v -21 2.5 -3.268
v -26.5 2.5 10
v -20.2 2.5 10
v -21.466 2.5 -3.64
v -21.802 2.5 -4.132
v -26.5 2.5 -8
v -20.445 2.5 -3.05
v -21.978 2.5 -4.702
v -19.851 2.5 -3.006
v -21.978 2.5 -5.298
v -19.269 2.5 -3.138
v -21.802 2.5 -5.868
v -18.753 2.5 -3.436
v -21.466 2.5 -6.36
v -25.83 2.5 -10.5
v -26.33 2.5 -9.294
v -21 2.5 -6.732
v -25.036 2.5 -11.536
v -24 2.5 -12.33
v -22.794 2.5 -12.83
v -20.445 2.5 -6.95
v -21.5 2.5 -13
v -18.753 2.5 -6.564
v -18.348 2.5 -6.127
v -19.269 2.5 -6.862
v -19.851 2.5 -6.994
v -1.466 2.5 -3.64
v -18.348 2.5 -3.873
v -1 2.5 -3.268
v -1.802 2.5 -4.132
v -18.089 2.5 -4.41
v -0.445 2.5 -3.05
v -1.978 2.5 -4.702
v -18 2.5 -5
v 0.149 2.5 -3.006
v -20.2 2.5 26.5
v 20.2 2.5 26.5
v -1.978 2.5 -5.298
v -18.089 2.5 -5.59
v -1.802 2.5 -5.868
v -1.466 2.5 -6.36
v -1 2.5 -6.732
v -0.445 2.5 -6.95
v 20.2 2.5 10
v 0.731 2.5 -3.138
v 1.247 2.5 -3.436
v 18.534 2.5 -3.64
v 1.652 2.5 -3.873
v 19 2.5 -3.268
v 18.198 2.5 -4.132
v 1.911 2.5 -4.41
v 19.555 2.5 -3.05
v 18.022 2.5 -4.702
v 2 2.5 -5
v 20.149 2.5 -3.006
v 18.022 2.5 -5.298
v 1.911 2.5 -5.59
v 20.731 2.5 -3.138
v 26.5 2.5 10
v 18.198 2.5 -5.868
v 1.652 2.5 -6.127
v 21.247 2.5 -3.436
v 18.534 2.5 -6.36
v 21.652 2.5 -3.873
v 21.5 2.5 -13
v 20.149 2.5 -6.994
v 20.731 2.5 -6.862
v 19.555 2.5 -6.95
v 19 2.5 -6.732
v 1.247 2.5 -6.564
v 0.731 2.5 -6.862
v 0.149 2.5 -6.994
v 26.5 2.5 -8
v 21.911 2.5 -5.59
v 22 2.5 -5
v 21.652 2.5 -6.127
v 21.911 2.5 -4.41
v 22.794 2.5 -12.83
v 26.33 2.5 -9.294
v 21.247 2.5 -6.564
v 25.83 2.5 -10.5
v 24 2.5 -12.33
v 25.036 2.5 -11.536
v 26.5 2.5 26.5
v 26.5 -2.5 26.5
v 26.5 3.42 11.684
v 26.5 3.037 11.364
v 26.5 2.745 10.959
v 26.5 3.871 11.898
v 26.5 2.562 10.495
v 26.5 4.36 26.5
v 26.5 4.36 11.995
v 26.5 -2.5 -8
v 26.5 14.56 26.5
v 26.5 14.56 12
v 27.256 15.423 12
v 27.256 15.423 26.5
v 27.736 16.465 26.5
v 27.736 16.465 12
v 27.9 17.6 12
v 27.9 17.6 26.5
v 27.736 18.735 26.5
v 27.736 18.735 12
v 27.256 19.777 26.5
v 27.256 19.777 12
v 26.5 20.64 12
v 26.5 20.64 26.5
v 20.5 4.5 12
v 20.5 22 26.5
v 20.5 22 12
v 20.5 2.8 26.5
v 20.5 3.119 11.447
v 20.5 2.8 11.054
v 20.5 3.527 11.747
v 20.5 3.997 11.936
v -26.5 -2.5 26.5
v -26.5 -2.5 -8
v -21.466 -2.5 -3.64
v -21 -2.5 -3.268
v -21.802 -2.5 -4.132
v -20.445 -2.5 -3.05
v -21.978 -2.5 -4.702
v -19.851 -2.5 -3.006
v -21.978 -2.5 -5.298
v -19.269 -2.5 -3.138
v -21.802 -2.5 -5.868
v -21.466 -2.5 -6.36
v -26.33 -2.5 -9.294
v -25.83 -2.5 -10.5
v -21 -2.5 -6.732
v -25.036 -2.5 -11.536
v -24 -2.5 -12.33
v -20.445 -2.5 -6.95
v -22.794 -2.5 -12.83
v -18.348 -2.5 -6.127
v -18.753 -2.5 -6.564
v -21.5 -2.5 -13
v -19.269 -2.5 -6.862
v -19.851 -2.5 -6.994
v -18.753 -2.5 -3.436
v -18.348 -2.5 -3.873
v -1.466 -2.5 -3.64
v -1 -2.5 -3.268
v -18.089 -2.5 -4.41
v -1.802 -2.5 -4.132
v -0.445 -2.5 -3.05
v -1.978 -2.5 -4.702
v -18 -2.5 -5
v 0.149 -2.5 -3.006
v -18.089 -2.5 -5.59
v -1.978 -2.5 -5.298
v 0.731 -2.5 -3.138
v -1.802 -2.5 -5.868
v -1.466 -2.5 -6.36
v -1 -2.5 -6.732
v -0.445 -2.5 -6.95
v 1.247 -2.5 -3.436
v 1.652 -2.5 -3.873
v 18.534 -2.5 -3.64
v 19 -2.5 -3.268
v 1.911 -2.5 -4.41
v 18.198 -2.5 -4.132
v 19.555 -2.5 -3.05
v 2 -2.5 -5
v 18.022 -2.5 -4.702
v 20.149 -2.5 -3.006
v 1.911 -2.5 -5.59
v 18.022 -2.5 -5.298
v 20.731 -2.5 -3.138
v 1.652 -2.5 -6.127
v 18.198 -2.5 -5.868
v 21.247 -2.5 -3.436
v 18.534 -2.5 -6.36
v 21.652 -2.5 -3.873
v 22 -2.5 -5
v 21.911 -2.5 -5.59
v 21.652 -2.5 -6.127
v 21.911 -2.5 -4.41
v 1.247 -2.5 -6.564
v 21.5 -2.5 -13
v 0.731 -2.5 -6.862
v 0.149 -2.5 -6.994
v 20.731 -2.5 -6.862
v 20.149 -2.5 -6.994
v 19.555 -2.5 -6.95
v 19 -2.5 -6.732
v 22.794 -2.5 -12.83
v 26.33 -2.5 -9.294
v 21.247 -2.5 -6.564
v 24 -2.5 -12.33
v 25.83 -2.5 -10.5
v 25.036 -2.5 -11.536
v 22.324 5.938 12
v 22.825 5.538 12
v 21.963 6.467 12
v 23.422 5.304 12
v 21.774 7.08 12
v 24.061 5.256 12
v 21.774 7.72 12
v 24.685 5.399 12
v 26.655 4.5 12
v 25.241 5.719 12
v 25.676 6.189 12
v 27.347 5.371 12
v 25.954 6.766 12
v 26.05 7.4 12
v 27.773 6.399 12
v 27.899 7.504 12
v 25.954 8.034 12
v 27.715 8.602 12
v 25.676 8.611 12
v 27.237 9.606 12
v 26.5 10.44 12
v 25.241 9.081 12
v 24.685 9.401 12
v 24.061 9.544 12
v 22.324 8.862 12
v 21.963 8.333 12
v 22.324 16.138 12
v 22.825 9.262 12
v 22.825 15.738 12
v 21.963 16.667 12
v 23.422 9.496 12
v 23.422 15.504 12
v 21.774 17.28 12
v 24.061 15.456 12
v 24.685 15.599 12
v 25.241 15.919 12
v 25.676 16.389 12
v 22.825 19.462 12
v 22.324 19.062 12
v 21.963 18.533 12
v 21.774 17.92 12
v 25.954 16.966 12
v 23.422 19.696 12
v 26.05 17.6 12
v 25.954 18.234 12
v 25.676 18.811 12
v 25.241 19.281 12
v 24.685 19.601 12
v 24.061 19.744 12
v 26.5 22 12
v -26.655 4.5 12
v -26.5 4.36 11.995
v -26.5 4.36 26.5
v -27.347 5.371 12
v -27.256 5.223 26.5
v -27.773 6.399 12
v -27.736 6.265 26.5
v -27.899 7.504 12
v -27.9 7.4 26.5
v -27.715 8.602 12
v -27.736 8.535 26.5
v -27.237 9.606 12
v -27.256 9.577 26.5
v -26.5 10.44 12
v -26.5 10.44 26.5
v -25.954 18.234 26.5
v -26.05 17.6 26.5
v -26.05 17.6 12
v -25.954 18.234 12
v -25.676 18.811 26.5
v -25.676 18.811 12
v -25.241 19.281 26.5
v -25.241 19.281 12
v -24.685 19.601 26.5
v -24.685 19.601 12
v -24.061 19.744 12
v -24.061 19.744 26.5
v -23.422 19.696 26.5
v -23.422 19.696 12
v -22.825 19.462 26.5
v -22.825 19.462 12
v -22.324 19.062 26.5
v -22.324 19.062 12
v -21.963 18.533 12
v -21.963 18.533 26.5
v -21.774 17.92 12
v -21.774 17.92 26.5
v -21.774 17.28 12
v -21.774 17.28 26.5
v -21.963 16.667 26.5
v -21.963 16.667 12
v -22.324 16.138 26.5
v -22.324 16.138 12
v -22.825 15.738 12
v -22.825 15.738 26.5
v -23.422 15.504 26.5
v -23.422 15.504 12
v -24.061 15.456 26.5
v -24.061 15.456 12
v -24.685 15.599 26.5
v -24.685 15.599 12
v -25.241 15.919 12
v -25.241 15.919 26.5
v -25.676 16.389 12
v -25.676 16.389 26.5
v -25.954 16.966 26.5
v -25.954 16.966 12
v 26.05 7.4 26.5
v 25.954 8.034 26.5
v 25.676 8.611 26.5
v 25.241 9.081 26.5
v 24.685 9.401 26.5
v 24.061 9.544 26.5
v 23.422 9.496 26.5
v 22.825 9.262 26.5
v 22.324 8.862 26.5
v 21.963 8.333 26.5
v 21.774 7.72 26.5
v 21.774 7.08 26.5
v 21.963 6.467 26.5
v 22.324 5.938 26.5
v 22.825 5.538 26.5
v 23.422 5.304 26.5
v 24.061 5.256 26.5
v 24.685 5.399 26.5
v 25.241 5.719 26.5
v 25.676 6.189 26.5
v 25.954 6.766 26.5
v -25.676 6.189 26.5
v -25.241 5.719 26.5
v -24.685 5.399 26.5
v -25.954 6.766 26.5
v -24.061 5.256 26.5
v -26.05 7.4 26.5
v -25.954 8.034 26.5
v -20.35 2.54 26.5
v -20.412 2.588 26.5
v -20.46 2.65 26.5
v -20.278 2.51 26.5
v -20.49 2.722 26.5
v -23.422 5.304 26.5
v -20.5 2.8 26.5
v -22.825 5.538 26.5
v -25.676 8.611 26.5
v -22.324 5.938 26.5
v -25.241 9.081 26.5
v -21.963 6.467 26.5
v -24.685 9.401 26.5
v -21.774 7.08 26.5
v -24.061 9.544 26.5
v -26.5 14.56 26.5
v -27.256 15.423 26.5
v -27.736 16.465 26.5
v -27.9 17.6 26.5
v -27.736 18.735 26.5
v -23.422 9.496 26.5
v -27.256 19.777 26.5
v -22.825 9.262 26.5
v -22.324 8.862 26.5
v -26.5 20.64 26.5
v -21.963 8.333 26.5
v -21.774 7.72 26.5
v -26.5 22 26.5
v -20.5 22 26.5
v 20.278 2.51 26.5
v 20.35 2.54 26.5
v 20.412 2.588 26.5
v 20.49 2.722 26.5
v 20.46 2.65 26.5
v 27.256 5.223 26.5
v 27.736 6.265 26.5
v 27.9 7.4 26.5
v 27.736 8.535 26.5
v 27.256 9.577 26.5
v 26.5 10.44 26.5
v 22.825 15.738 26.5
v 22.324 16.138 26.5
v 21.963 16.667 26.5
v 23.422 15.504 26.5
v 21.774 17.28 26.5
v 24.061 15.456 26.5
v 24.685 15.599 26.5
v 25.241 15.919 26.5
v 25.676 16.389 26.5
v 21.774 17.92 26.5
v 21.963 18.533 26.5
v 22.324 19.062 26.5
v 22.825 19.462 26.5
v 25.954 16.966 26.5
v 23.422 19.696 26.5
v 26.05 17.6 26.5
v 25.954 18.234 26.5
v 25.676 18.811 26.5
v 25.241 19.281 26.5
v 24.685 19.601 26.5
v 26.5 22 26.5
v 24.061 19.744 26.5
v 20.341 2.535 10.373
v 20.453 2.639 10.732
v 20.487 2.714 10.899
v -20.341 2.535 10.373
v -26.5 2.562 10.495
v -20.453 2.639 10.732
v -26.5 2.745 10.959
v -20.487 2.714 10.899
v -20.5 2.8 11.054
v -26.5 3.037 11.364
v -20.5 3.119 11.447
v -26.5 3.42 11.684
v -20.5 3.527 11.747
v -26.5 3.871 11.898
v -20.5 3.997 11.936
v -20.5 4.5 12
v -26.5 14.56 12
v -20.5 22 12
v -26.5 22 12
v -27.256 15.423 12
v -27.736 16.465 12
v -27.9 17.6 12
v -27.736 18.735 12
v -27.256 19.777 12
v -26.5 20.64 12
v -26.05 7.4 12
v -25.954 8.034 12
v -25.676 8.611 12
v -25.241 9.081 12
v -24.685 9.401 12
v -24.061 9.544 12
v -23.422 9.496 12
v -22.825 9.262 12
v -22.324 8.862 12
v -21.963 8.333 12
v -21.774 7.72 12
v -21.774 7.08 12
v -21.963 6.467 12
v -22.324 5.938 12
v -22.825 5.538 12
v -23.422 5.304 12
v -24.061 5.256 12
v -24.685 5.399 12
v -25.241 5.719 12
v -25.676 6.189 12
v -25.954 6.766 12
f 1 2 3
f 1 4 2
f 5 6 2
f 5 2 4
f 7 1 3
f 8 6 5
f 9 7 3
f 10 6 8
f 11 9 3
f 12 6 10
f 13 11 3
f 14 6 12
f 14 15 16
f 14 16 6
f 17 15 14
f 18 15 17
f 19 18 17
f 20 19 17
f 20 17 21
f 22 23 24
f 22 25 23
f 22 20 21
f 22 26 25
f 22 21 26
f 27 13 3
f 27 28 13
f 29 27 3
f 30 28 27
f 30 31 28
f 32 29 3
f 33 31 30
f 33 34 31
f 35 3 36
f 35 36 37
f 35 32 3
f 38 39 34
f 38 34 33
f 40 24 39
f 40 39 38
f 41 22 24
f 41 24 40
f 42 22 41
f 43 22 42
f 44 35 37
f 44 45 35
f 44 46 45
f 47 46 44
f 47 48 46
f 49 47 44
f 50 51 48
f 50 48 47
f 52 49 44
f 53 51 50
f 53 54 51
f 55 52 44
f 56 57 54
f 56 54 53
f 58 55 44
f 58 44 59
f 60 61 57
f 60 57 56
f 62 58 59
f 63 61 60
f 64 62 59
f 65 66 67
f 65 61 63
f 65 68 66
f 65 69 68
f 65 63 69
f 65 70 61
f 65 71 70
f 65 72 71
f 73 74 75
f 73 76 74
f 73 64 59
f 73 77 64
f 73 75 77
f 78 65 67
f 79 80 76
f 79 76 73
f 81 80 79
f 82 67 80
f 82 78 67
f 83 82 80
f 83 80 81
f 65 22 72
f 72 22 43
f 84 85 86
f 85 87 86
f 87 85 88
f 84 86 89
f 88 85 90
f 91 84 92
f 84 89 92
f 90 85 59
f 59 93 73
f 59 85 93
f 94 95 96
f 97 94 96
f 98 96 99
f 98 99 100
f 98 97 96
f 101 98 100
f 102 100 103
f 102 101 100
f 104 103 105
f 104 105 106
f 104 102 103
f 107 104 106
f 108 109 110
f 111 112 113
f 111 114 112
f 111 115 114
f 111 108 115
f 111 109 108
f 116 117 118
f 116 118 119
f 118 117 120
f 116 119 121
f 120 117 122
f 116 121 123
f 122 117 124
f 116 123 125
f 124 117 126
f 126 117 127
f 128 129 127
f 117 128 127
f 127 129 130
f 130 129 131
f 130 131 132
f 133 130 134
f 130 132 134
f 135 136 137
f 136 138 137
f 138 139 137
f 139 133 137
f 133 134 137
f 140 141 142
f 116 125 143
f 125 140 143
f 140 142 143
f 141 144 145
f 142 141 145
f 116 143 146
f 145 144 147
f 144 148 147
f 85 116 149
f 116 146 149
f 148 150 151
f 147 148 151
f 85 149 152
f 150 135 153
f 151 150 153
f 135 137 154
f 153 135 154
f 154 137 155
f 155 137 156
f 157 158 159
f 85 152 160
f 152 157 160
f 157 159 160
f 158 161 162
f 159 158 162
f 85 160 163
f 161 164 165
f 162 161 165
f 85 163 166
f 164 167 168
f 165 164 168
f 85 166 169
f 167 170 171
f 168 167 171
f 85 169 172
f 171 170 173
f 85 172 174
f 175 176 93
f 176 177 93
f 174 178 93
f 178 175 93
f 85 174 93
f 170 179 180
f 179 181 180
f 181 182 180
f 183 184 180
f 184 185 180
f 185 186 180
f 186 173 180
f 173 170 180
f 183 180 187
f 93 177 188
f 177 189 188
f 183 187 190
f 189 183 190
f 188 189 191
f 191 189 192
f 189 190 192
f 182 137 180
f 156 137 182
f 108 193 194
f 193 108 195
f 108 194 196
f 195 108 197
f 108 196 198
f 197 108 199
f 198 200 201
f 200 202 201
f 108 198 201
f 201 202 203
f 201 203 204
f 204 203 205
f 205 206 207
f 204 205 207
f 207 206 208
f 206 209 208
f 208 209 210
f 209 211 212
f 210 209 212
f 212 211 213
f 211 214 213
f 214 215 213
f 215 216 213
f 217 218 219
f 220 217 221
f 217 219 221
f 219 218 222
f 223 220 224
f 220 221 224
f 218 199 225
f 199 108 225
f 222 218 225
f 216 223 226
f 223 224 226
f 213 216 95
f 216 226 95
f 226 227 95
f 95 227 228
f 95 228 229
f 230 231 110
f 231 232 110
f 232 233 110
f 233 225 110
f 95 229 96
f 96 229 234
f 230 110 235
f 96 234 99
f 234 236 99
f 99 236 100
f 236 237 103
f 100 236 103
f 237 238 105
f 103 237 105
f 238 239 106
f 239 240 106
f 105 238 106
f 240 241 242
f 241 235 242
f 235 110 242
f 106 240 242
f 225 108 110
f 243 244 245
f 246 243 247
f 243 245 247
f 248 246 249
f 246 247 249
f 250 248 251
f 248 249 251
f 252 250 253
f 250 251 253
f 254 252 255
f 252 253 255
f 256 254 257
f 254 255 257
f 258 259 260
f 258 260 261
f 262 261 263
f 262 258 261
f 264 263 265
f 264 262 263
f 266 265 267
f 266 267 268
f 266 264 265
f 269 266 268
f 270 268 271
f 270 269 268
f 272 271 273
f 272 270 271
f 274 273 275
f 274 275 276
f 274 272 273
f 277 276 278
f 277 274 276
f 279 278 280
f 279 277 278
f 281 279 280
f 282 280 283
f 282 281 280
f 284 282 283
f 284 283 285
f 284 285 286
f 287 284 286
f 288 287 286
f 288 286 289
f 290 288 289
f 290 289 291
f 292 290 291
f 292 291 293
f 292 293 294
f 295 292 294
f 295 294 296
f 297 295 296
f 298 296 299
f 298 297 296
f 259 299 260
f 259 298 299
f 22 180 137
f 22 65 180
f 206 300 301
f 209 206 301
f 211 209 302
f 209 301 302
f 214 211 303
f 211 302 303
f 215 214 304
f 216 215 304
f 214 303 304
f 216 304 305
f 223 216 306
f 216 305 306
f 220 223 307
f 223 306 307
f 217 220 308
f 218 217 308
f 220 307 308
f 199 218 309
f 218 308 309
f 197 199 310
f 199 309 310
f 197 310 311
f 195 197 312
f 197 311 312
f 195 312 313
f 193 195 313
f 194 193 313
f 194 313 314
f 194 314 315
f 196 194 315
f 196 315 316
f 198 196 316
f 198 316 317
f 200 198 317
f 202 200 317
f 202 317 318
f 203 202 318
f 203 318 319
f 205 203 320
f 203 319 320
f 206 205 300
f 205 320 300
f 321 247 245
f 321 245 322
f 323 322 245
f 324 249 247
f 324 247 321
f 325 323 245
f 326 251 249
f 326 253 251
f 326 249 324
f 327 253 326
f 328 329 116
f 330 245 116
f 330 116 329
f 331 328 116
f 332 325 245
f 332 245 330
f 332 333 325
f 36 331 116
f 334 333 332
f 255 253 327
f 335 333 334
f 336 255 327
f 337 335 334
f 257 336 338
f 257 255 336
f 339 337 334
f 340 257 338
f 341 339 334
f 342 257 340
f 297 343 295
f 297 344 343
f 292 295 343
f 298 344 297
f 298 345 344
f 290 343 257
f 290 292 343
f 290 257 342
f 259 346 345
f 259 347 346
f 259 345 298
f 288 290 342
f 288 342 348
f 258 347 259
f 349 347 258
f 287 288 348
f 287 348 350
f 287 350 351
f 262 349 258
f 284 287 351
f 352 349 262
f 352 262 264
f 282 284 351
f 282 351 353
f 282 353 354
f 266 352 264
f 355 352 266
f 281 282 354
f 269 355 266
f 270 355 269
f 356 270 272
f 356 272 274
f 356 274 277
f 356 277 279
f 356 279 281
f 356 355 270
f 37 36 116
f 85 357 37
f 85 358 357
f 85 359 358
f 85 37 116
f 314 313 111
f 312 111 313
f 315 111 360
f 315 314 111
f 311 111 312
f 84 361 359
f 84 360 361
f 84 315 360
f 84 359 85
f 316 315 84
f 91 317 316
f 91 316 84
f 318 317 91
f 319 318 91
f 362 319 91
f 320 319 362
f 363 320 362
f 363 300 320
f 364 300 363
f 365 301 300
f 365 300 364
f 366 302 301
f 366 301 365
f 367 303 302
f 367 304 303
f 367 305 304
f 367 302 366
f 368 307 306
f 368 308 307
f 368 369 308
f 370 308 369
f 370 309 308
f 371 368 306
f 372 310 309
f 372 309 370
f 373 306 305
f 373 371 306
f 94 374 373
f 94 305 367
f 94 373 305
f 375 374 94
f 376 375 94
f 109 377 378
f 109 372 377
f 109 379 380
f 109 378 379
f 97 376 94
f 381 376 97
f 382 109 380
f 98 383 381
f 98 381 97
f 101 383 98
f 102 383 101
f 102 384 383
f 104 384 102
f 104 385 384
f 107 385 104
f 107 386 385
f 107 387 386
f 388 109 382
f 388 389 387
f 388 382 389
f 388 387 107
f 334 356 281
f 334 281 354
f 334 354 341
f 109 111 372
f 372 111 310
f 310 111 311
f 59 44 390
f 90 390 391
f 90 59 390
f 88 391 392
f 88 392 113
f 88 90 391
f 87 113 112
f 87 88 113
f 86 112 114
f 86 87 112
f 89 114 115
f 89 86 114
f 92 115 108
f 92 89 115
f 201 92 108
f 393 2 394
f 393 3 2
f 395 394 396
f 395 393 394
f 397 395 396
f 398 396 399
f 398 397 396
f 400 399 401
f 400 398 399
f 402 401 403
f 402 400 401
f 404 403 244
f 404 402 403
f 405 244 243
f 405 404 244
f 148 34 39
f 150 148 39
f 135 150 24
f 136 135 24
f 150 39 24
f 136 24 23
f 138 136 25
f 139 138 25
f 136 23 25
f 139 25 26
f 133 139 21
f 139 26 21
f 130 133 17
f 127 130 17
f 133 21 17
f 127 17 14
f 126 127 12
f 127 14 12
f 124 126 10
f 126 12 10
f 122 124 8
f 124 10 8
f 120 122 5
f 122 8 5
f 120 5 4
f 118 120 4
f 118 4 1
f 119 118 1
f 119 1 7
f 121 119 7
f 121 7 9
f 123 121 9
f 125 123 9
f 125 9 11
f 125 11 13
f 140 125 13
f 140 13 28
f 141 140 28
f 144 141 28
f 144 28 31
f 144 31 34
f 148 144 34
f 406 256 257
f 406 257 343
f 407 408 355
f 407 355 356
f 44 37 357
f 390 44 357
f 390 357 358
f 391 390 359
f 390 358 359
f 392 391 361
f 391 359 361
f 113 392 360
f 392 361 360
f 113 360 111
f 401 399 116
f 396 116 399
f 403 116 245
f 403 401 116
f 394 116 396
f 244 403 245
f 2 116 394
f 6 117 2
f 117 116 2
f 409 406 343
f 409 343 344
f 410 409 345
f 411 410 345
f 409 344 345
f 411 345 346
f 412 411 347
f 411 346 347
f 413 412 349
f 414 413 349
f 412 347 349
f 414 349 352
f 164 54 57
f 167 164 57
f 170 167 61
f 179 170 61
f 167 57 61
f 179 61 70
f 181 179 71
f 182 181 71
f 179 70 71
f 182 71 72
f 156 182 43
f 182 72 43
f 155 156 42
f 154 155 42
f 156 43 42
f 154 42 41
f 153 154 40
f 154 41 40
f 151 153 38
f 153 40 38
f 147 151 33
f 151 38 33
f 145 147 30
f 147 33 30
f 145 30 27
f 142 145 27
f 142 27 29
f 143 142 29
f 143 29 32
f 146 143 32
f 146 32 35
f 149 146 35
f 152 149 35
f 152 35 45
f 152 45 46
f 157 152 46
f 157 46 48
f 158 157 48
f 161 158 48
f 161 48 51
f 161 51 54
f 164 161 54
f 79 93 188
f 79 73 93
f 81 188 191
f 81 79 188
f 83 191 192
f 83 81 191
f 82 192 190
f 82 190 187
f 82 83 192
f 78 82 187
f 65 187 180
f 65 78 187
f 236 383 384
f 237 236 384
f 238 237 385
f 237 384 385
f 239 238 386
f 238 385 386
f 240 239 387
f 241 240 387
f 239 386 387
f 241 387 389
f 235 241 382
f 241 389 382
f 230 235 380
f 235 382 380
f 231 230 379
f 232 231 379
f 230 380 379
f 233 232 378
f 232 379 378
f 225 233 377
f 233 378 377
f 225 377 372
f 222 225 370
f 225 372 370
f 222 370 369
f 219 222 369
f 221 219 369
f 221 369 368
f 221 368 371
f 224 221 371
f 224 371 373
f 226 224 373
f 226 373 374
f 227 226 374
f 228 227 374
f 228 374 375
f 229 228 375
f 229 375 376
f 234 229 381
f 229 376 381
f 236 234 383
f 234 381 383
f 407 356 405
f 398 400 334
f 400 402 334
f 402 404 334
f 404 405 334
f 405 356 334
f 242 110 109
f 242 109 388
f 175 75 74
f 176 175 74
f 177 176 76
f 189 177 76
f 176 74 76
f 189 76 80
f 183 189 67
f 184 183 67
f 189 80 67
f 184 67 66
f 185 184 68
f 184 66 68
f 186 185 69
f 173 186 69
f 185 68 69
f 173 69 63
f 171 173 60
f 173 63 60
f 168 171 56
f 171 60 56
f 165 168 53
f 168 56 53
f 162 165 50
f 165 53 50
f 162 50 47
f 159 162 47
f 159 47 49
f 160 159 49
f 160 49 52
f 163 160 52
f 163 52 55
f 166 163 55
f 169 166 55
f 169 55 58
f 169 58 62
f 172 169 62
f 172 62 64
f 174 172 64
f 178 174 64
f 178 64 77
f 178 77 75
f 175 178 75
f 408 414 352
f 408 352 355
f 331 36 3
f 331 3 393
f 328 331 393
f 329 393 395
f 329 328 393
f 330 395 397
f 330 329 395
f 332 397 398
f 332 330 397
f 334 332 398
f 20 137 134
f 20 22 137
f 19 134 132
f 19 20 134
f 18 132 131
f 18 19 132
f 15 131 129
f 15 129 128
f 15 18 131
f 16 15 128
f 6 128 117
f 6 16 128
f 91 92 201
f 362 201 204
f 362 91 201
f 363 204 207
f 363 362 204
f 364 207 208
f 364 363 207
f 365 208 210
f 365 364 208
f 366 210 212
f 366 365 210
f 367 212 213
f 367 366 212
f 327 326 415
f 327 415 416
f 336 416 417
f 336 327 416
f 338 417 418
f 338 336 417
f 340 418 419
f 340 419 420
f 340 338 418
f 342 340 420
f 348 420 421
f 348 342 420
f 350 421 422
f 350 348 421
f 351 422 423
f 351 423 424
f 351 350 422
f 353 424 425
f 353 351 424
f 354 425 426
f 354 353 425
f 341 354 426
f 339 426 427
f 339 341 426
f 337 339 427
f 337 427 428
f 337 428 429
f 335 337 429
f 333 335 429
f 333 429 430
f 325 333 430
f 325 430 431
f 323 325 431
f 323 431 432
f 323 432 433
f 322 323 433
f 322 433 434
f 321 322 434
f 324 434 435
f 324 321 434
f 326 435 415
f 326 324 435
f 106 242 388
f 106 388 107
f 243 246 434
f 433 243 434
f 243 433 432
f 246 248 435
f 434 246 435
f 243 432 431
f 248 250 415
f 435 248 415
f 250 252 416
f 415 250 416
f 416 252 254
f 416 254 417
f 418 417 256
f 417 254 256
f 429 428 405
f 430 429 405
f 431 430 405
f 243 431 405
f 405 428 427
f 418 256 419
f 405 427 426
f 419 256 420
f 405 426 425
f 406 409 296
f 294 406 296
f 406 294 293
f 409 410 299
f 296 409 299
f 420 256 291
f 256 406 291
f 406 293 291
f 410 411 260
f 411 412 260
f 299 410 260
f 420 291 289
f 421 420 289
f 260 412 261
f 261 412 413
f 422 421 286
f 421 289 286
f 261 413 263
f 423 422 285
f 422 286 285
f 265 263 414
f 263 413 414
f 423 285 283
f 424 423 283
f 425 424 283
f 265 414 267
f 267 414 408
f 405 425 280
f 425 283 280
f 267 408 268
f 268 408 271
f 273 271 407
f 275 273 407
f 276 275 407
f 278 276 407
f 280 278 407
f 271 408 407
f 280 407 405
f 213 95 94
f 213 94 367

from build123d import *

# Parameters (mm, degrees)
BOSS_EXTRUDE1_DEPTH = 26.5
SKETCH4_W           = 6
SKETCH4_H           = 12
CUT_EXTRUDE2_DEPTH  = 19.5
FILLET2_R           = 0.3
FILLET3_R           = 0.3
BOSS_EXTRUDE3_DEPTH = 14.5
SKETCH8_R           = 2.15
CUT_EXTRUDE4_DEPTH  = 14.5
FILLET4_R           = 2
SKETCH9_W           = 53
SKETCH9_H           = 5
BOSS_EXTRUDE4_DEPTH = 13
SKETCH10_R          = 2
CUT_EXTRUDE5_DEPTH  = 10
FILLET9_R           = 5
SKETCH11_W          = 53
SKETCH11_H          = 5
BOSS_EXTRUDE5_DEPTH = 6.5
FILLET11_R          = 5
SKETCH12_W          = 57.342975089
SKETCH12_H          = 7.176836001
CUT_EXTRUDE6_DEPTH  = 5


with BuildPart() as part:
    # Sketch1 → Boss-Extrude1 (new body)
    with BuildSketch(Plane.XY):
        Polygon((-20.5, 2.5), (20.5, 2.5), (20.5, 22), (26.5, 22), (26.5, -2.5), (-26.5, -2.5), (-26.5, 22), (-20.5, 22), align=None)
    extrude(amount=BOSS_EXTRUDE1_DEPTH)

    # Sketch4 → Cut-Extrude2 (cut)
    with BuildSketch(Plane(origin=(0, 22, 0), x_dir=(1, 0, 0), z_dir=(0, 1, 0))):
        with Locations((-23.5, -6)):
            Rectangle(SKETCH4_W, SKETCH4_H)
        with Locations((23.5, -6)):
            Rectangle(SKETCH4_W, SKETCH4_H)
    extrude(amount=-CUT_EXTRUDE2_DEPTH, mode=Mode.SUBTRACT)

    # Fillet2
    fillet2_edges = [part.edges().sort_by_distance(p)[0] for p in [
        (20.5, 2.5, 19.25),
    ]]
    fillet(fillet2_edges, radius=FILLET2_R)

    # Fillet3
    fillet3_edges = [part.edges().sort_by_distance(p)[0] for p in [
        (-20.5, 2.5, 19.25),
    ]]
    fillet(fillet3_edges, radius=FILLET3_R)

    # Sketch7 → Boss-Extrude3 (add)
    with BuildSketch(Plane.XY.offset(26.5)):
        with BuildLine():
            Line((20.5, 19.707130751), (20.5, 15.492869249))
            ThreePointArc((20.5, 15.492869249), (27.9, 17.6), (20.5, 19.707130751))
        make_face()
        with BuildLine():
            Line((20.5, 9.507130751), (20.5, 5.292869249))
            ThreePointArc((20.5, 5.292869249), (27.9, 7.4), (20.5, 9.507130751))
        make_face()
    boss_extrude3 = extrude(amount=-BOSS_EXTRUDE3_DEPTH)

    # Sketch8 → Cut-Extrude4 (cut)
    with BuildSketch(Plane.XY.offset(26.5)):
        with Locations((23.9, 17.6)):
            Circle(SKETCH8_R)
        with Locations((23.9, 7.4)):
            Circle(SKETCH8_R)
    cut_extrude4 = extrude(amount=-CUT_EXTRUDE4_DEPTH, mode=Mode.SUBTRACT)

    # Mirror3: Boss-Extrude3, Cut-Extrude4 across plane
    add(boss_extrude3.mirror(Plane.ZY))
    add(cut_extrude4.mirror(Plane.ZY), mode=Mode.SUBTRACT)

    # Fillet4
    fillet4_edges = [part.edges().sort_by_distance(p)[0] for p in [
        (-23.35, 2.5, 12),
        (23.35, 2.5, 12),
    ]]
    fillet(fillet4_edges, radius=FILLET4_R)

    # Sketch9 → Boss-Extrude4 (add)
    with BuildSketch(Plane(origin=(0, 0, 0), x_dir=(-1, 0, 0), z_dir=(0, 0, -1))):
        Rectangle(SKETCH9_W, SKETCH9_H)
    extrude(amount=BOSS_EXTRUDE4_DEPTH)

    # Sketch10 → Cut-Extrude5 (cut)
    with BuildSketch(Plane(origin=(0, 2.5, 0), x_dir=(1, 0, 0), z_dir=(0, 1, 0))):
        with Locations((20, 5)):
            Circle(SKETCH10_R)
        with Locations((0, 5)):
            Circle(SKETCH10_R)
        with Locations((-20, 5)):
            Circle(SKETCH10_R)
    extrude(amount=-CUT_EXTRUDE5_DEPTH, mode=Mode.SUBTRACT)

    # Fillet9
    fillet9_edges = [part.edges().sort_by_distance(p)[0] for p in [
        (-26.5, 0, -13),
        (26.5, 0, -13),
    ]]
    fillet(fillet9_edges, radius=FILLET9_R)

    # Sketch11 → Boss-Extrude5 (add)
    with BuildSketch(Plane.XY.offset(26.5)):
        Rectangle(SKETCH11_W, SKETCH11_H)
    extrude(amount=BOSS_EXTRUDE5_DEPTH)

    # Fillet11
    fillet11_edges = [part.edges().sort_by_distance(p)[0] for p in [
        (-26.5, 0, 33),
        (26.5, 0, 33),
    ]]
    fillet(fillet11_edges, radius=FILLET11_R)

    # Sketch12 → Cut-Extrude6 (cut)
    with BuildSketch(Plane(origin=(0, 2.5, 0), x_dir=(1, 0, 0), z_dir=(0, 1, 0))):
        with Locations((-0.596167356, -30.088418001)):
            Rectangle(SKETCH12_W, SKETCH12_H)
    extrude(amount=-CUT_EXTRUDE6_DEPTH, mode=Mode.SUBTRACT)


solid = part.part
